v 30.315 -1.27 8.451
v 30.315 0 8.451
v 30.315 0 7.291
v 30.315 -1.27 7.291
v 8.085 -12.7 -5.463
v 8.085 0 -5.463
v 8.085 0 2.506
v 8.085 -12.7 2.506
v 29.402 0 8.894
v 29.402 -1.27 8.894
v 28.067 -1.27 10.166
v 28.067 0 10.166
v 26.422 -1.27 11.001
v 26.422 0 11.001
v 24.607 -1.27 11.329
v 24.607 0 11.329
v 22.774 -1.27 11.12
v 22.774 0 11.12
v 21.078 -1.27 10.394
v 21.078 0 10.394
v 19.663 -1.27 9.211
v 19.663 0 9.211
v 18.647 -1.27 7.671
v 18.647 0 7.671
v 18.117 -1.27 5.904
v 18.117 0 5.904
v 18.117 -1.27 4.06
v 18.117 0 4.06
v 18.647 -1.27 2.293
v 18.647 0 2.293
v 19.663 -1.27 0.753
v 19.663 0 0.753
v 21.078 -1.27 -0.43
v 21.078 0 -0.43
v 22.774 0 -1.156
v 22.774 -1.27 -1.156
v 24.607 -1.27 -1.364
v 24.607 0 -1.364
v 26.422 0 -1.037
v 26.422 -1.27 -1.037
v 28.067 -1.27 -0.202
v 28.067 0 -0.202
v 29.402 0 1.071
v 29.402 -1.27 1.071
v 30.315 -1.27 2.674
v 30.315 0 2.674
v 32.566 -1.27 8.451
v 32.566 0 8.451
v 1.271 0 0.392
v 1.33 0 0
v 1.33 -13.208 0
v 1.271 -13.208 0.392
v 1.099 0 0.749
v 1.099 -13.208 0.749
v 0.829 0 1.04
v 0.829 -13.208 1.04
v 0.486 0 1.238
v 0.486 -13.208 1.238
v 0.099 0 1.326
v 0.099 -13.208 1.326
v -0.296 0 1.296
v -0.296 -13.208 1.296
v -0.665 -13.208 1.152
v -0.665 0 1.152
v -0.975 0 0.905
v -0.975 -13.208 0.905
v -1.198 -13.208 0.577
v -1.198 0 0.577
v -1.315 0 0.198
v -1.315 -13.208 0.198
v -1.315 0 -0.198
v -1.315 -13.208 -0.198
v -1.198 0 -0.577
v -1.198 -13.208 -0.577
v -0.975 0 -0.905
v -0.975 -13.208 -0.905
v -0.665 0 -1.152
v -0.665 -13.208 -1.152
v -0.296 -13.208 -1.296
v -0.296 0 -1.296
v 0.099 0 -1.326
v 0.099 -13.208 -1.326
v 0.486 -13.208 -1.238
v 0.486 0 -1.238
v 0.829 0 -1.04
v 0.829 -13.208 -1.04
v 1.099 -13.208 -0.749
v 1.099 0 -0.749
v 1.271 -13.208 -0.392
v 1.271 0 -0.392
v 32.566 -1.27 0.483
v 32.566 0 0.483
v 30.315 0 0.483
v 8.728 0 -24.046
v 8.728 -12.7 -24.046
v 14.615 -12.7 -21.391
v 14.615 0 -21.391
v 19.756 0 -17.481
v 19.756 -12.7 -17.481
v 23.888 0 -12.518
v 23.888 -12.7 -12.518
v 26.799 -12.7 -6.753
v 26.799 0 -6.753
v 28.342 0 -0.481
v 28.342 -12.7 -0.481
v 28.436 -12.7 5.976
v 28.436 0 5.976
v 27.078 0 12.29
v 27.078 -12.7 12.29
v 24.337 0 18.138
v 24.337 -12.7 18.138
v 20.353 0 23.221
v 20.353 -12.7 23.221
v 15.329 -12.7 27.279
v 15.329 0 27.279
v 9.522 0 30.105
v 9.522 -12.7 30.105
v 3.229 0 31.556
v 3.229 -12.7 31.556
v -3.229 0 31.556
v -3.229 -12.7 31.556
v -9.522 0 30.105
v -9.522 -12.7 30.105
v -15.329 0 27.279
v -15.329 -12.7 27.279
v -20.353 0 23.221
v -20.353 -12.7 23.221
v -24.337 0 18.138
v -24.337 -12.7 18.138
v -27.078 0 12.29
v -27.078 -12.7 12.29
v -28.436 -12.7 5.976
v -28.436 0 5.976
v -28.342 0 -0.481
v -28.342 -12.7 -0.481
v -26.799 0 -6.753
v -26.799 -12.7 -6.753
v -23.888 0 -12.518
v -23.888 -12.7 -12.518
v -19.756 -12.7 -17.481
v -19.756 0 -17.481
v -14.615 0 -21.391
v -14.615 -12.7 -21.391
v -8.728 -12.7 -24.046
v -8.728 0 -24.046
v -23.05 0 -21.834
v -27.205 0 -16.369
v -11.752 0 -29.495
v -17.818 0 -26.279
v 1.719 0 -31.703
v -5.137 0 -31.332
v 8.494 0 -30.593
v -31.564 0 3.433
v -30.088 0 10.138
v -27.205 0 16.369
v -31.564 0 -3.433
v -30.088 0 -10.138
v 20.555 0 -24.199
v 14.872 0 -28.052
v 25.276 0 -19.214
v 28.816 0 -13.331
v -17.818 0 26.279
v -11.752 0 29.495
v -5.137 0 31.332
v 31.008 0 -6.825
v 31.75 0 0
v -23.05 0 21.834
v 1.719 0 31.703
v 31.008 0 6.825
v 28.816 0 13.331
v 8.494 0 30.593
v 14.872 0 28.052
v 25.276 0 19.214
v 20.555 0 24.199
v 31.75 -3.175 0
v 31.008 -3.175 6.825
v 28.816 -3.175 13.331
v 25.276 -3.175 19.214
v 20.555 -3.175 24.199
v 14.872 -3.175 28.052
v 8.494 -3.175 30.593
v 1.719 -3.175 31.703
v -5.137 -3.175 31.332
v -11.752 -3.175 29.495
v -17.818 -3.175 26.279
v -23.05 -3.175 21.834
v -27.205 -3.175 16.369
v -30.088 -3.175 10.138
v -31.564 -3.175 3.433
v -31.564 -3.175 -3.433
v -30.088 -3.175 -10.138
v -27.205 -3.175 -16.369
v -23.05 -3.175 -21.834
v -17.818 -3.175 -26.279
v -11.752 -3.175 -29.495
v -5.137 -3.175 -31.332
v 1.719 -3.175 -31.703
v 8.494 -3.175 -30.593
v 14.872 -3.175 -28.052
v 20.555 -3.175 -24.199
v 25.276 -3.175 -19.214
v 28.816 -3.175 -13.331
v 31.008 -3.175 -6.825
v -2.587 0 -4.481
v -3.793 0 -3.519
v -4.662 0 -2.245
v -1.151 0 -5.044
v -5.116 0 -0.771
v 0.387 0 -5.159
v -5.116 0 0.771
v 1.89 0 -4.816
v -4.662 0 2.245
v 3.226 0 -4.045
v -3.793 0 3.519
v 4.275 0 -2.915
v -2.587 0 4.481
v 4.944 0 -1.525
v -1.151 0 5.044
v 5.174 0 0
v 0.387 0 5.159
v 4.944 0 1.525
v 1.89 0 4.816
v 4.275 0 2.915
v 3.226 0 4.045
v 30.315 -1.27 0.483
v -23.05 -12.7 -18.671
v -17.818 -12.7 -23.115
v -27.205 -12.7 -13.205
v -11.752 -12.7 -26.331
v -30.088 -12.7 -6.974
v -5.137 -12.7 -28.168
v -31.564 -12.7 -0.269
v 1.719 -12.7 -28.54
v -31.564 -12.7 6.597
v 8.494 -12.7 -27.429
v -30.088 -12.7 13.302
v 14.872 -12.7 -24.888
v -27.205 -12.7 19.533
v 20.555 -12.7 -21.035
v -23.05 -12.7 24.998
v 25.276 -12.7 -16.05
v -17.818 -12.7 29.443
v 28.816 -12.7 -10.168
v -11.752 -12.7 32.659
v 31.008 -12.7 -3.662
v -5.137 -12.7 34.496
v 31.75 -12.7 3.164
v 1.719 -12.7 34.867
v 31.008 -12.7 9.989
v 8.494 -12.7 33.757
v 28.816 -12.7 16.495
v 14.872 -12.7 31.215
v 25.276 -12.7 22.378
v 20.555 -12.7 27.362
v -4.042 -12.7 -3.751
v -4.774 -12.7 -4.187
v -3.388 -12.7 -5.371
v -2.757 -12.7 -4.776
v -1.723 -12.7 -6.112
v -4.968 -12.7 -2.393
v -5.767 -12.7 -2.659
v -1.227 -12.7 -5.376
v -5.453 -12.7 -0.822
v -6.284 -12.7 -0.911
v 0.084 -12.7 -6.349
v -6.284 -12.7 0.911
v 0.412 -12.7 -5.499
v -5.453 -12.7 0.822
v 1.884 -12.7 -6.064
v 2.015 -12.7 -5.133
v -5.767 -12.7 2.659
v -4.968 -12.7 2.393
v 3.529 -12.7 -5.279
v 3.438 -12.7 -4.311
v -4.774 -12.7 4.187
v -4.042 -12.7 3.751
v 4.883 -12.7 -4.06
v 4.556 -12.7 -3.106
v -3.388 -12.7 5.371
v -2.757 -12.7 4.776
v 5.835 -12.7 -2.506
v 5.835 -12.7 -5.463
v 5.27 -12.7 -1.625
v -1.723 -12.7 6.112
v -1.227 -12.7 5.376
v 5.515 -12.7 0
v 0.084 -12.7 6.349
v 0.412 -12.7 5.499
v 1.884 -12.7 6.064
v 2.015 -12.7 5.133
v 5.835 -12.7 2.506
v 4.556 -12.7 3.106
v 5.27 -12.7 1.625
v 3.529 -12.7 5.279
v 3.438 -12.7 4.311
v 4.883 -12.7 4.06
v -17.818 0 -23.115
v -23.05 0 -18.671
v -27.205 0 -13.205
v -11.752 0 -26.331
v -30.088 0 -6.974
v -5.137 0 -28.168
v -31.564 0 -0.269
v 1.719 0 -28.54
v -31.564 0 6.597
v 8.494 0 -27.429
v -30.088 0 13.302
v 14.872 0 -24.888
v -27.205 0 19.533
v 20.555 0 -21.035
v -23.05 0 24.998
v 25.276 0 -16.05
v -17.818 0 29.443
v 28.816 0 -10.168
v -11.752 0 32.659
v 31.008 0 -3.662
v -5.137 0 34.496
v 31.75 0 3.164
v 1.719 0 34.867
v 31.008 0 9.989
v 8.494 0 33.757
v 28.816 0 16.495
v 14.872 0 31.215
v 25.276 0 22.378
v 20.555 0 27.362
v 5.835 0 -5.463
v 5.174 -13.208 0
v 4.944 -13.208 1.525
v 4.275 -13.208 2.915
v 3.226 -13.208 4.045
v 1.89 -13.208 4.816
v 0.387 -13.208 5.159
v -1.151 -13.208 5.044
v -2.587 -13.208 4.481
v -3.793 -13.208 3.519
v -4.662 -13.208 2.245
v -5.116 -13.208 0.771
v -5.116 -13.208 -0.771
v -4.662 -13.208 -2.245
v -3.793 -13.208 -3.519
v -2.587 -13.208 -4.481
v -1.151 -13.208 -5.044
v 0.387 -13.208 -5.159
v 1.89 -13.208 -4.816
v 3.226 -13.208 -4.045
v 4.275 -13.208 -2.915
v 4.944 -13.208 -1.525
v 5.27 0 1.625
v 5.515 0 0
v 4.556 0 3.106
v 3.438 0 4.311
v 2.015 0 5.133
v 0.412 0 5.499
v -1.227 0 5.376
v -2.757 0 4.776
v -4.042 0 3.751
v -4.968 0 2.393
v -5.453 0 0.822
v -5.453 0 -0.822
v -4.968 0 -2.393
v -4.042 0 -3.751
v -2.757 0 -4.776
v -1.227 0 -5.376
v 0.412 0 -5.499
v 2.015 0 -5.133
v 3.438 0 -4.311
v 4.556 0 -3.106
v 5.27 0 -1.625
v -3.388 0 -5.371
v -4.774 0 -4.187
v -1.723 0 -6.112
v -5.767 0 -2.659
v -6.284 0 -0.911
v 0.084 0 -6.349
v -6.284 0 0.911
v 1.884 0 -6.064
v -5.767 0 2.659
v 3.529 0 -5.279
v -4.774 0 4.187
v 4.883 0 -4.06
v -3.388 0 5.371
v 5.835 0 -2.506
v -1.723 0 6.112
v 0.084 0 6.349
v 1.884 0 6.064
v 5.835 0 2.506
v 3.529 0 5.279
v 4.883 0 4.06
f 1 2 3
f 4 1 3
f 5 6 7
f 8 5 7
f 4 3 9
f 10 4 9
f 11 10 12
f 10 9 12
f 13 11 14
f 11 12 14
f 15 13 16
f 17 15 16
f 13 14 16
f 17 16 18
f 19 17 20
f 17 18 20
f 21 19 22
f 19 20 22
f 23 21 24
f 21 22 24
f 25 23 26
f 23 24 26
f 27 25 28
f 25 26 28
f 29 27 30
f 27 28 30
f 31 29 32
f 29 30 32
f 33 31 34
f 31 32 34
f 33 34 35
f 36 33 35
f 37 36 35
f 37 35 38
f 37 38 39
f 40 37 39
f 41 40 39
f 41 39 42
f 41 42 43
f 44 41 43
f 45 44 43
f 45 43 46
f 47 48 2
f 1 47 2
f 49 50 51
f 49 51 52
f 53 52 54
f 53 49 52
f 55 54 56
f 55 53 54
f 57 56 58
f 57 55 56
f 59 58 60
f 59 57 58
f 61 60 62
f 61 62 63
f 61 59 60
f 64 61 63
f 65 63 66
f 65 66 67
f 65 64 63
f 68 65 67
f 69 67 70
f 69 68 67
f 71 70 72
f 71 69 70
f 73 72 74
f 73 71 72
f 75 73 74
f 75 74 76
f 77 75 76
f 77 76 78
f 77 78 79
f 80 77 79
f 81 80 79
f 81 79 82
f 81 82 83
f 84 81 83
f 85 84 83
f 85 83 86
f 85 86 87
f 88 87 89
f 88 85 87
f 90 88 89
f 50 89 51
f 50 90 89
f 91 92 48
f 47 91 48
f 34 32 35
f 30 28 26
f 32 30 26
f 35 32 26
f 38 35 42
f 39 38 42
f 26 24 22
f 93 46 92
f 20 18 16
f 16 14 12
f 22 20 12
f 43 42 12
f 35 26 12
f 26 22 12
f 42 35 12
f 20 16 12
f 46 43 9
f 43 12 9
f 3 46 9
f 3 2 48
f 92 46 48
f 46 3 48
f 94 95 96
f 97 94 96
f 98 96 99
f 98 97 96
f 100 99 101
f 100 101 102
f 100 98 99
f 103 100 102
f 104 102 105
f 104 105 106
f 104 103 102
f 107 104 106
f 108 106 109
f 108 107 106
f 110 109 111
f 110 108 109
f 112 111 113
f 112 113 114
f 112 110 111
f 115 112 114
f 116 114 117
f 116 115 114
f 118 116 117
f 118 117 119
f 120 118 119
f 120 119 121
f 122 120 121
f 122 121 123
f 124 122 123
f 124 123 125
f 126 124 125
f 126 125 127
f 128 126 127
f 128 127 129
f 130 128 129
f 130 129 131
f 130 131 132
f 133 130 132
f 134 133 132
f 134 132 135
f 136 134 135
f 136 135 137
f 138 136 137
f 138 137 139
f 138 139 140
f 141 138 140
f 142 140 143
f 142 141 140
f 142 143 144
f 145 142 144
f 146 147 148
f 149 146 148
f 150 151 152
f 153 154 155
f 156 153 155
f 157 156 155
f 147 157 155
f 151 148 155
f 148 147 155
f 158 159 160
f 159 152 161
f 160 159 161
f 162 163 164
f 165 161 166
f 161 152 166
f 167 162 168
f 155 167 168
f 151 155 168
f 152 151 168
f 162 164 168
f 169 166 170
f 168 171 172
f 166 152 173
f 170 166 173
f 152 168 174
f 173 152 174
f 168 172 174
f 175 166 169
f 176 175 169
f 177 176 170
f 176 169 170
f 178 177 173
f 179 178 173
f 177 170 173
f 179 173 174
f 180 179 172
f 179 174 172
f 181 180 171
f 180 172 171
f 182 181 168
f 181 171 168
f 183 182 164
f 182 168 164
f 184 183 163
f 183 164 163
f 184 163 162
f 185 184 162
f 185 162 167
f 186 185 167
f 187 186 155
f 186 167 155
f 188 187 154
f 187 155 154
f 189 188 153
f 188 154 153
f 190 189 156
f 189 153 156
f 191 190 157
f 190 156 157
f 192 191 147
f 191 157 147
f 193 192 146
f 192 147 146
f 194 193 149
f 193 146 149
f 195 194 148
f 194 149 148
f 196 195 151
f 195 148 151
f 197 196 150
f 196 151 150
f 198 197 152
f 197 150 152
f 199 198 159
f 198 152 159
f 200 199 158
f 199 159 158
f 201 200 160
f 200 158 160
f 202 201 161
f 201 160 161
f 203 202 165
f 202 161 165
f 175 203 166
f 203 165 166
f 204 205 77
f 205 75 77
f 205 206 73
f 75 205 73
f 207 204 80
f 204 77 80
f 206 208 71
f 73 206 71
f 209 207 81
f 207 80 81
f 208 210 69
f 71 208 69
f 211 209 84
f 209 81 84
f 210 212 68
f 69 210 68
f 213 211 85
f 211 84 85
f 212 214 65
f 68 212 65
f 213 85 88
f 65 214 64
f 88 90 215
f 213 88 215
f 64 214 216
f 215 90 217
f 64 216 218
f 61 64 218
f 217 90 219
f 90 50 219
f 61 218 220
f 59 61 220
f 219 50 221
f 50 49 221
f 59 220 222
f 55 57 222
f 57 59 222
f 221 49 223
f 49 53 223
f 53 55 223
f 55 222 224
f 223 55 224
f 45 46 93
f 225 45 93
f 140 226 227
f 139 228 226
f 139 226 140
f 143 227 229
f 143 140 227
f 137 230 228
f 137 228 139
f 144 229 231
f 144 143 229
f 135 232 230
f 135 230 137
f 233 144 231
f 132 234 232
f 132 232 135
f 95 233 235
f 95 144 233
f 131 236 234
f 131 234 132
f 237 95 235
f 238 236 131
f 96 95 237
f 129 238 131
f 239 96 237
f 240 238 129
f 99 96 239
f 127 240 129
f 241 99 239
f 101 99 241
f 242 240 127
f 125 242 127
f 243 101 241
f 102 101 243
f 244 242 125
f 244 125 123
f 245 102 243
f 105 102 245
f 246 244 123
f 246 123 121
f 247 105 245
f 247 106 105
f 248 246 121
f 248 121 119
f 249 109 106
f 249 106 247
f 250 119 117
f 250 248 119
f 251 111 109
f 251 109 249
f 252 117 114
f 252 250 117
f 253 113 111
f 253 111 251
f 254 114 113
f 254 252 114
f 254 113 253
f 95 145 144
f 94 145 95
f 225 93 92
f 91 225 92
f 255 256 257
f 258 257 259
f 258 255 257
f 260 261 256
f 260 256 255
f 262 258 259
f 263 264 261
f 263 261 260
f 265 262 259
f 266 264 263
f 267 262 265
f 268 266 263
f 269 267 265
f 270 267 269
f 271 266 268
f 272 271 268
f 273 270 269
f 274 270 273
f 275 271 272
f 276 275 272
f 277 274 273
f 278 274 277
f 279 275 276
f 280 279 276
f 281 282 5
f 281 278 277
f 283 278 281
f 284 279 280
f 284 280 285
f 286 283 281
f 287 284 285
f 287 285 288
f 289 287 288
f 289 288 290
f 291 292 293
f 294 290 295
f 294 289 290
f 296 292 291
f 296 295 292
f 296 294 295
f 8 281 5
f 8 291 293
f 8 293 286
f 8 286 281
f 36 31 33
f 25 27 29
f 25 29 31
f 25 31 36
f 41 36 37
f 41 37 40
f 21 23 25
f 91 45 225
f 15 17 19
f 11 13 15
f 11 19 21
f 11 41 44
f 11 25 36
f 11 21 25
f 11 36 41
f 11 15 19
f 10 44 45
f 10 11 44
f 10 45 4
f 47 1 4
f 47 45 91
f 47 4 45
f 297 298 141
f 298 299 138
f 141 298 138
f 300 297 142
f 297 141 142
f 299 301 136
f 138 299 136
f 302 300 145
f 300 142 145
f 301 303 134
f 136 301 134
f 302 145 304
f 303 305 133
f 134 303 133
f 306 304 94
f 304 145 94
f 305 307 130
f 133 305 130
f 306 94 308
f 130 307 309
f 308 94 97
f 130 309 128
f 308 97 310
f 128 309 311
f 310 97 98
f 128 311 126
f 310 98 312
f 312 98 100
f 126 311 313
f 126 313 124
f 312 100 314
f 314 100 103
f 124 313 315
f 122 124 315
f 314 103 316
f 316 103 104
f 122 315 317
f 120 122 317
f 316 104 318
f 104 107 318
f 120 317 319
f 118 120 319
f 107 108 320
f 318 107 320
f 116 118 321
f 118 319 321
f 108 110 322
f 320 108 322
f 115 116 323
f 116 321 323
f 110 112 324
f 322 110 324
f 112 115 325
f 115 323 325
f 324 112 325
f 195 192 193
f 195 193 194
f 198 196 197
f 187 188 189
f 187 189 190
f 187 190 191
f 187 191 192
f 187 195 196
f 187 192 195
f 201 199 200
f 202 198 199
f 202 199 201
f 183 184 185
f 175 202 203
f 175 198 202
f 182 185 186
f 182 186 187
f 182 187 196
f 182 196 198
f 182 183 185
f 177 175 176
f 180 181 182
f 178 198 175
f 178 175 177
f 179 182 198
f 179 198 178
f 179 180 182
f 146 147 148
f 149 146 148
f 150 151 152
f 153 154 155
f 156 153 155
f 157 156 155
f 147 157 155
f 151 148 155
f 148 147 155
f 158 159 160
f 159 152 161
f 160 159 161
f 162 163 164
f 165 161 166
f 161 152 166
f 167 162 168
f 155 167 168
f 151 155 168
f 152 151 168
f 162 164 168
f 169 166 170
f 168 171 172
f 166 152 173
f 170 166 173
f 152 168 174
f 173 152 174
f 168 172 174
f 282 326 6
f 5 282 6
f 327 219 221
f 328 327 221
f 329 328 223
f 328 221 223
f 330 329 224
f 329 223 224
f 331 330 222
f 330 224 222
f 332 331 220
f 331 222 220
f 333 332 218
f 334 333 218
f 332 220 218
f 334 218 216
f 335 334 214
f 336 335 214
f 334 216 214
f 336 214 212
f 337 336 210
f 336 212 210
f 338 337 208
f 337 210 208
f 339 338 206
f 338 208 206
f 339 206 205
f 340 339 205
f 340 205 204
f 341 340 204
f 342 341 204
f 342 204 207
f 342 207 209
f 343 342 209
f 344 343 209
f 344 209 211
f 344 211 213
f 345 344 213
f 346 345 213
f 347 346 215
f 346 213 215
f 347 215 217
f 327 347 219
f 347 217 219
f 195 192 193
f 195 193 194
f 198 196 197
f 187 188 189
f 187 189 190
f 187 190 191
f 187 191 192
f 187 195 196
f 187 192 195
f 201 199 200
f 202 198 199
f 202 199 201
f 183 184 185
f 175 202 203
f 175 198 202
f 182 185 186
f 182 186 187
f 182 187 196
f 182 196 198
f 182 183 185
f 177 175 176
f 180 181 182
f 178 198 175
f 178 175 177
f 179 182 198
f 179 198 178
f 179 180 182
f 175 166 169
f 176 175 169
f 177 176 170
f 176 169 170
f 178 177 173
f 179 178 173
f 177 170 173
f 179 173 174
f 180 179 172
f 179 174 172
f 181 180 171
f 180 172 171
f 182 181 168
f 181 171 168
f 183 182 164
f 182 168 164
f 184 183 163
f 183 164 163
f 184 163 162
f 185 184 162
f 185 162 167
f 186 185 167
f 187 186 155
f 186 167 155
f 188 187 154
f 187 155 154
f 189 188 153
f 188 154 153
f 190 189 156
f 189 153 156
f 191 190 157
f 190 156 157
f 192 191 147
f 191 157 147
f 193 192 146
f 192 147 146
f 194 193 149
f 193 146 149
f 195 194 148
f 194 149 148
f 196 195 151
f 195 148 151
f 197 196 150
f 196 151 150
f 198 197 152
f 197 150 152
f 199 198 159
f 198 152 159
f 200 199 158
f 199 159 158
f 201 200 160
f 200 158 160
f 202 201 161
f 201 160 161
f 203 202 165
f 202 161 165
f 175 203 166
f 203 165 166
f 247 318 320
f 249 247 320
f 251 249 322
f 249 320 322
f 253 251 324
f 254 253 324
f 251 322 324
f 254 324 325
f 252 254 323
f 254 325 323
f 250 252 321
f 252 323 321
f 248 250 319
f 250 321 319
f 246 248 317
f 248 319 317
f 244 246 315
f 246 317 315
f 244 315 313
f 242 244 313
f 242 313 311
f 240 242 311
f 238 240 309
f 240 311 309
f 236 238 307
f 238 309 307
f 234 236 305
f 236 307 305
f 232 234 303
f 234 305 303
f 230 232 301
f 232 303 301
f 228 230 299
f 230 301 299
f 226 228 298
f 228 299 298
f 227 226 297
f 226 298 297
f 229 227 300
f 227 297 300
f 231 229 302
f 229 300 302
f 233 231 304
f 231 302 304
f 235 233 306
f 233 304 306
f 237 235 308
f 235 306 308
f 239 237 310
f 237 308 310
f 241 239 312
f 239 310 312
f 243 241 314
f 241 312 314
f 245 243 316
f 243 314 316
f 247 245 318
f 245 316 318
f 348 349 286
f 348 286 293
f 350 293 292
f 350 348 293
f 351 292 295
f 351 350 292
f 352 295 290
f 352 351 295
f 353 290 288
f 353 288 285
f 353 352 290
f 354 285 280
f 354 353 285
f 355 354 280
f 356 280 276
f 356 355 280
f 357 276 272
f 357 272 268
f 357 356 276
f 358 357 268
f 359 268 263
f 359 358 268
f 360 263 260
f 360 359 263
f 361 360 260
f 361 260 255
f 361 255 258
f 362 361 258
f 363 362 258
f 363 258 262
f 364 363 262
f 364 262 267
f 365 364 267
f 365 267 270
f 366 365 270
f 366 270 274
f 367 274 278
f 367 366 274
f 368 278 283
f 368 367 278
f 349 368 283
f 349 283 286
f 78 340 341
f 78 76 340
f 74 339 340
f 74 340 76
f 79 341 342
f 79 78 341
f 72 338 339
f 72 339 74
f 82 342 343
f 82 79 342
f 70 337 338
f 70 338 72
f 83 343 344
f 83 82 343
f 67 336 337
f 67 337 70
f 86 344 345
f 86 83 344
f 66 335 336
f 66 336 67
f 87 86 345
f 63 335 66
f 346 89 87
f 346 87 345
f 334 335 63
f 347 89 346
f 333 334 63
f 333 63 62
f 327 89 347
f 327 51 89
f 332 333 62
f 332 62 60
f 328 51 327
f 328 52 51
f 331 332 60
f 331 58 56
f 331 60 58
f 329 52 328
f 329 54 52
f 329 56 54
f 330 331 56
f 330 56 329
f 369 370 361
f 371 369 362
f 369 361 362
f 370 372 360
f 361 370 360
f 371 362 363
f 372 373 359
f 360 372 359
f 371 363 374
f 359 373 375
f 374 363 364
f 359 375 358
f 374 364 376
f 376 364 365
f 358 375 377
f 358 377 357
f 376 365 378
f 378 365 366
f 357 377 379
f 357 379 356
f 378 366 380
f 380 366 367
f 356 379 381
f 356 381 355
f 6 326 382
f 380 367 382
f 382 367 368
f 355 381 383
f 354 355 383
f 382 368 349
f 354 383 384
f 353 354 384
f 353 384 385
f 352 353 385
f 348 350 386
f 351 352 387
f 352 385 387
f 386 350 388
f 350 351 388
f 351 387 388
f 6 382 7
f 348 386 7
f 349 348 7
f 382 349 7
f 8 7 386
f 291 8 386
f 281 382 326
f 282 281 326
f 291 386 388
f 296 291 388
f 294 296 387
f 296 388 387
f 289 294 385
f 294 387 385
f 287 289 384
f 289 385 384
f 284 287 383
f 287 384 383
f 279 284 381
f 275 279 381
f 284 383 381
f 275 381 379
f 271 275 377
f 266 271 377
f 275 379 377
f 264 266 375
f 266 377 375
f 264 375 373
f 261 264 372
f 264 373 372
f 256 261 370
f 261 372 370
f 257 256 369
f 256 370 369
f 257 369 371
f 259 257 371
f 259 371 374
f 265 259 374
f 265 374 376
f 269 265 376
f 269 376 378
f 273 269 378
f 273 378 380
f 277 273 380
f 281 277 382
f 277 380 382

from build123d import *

# Parameters (mm, degrees)
F0_R      = 31.75
F0_R_2    = 28.575
F1_DEPTH  = 12.7
F2_R      = 31.75
F3_DEPTH  = 3.175
F4_R      = 31.75
F5_DEPTH  = 3.175
F6_W      = 21.4458070695
F6_H      = 1.7393454909
F7_DEPTH  = 12.7
F8_R      = 5.5145784087
F9_DEPTH  = 12.7
F10_DEPTH = 1.27
F8_R_2    = 5.1739063848
F8_R_3    = 1.3298288243
F11_DEPTH = 13.208


with BuildPart() as f1:
    # F0 (on Front) → F1 (new body)
    with BuildSketch(Plane.XZ):
        with Locations((0, 3.1637951601)):
            Circle(F0_R)
        with Locations((0, 3.1637951601)):
            Circle(F0_R_2, mode=Mode.SUBTRACT)
    extrude(amount=F1_DEPTH)

    # F6 (on Front) → F7 (join)
    with BuildSketch(Plane.XZ):
        with Locations((0, -24.9152500182)):
            Rectangle(F6_W, F6_H)
    extrude(amount=F7_DEPTH)


with BuildPart() as f3:
    # F2 (on Front) → F3 (new body)
    with BuildSketch(Plane.XZ):
        Circle(F2_R)
    extrude(amount=F3_DEPTH)


with BuildPart() as f5:
    # F4 (on Front) → F5 (new body)
    with BuildSketch(Plane.XZ):
        Circle(F4_R)
    extrude(amount=F5_DEPTH)


with BuildPart() as f9:
    # F8 (on Front) → F9 (new body)
    with BuildSketch(Plane.XZ):
        with BuildLine():
            Line((5.8347795857, -2.5055632473), (5.8347795857, 2.5055632473))
            ThreePointArc((5.8347795857, 2.5055632473), (-6.35, 0), (5.8347795857, -2.5055632473))
        make_face()
        Circle(F8_R, mode=Mode.SUBTRACT)
        with BuildLine():
            ThreePointArc((5.8347795857, 2.5055632473), (6.2198613477, 1.2789936729), (6.35, 0))
            ThreePointArc((6.35, 0), (6.2198613477, -1.2789936729), (5.8347795857, -2.5055632473))
            Line((5.8347795857, -2.5055632473), (5.8347795857, -5.4628530052))
            Line((5.8347795857, -5.4628530052), (8.0852303654, -5.4628530052))
            Line((8.0852303654, -5.4628530052), (8.0852303654, 2.5055632473))
            Line((8.0852303654, 2.5055632473), (5.8347795857, 2.5055632473))
        make_face()
        with BuildLine():
            ThreePointArc((5.8347795857, -2.5055632473), (6.2198613477, -1.2789936729), (6.35, 0))
            ThreePointArc((6.35, 0), (6.2198613477, 1.2789936729), (5.8347795857, 2.5055632473))
            Line((5.8347795857, 2.5055632473), (5.8347795857, -2.5055632473))
        make_face()
    extrude(amount=F9_DEPTH)


with BuildPart() as f10:
    # F8 (on Front) → F10 (new body)
    with BuildSketch(Plane.XZ):
        with BuildLine():
            Line((30.3154438734, 2.6735466489), (30.3154438734, 7.2907341129))
            ThreePointArc((30.3154438734, 7.2907341129), (18.0499646045, 4.9821403809), (30.3154438734, 2.6735466489))
        make_face()
        with BuildLine():
            ThreePointArc((30.3154438734, 2.6735466489), (30.6403890035, 3.8075752182), (30.7499646045, 4.9821403809))
            ThreePointArc((30.7499646045, 4.9821403809), (30.6403890035, 6.1567055435), (30.3154438734, 7.2907341129))
            Line((30.3154438734, 7.2907341129), (30.3154438734, 2.6735466489))
        make_face()
        with BuildLine():
            ThreePointArc((30.3154438734, 7.2907341129), (30.6403890035, 6.1567055435), (30.7499646045, 4.9821403809))
            ThreePointArc((30.7499646045, 4.9821403809), (30.6403890035, 3.8075752182), (30.3154438734, 2.6735466489))
            Line((30.3154438734, 2.6735466489), (30.3154438734, 0.4826000077))
            Line((30.3154438734, 0.4826000077), (32.5658946531, 0.4826000077))
            Line((32.5658946531, 0.4826000077), (32.5658946531, 8.4510162601))
            Line((32.5658946531, 8.4510162601), (30.3154438734, 8.4510162601))
            Line((30.3154438734, 8.4510162601), (30.3154438734, 7.2907341129))
        make_face()
    extrude(amount=F10_DEPTH)


with BuildPart() as f11:
    # F8 (on Front) → F11 (new body)
    with BuildSketch(Plane.XZ):
        Circle(F8_R_2)
        Circle(F8_R_3, mode=Mode.SUBTRACT)
    extrude(amount=F11_DEPTH)


solid = Compound([f1.part, f3.part, f5.part, f9.part, f10.part, f11.part])
